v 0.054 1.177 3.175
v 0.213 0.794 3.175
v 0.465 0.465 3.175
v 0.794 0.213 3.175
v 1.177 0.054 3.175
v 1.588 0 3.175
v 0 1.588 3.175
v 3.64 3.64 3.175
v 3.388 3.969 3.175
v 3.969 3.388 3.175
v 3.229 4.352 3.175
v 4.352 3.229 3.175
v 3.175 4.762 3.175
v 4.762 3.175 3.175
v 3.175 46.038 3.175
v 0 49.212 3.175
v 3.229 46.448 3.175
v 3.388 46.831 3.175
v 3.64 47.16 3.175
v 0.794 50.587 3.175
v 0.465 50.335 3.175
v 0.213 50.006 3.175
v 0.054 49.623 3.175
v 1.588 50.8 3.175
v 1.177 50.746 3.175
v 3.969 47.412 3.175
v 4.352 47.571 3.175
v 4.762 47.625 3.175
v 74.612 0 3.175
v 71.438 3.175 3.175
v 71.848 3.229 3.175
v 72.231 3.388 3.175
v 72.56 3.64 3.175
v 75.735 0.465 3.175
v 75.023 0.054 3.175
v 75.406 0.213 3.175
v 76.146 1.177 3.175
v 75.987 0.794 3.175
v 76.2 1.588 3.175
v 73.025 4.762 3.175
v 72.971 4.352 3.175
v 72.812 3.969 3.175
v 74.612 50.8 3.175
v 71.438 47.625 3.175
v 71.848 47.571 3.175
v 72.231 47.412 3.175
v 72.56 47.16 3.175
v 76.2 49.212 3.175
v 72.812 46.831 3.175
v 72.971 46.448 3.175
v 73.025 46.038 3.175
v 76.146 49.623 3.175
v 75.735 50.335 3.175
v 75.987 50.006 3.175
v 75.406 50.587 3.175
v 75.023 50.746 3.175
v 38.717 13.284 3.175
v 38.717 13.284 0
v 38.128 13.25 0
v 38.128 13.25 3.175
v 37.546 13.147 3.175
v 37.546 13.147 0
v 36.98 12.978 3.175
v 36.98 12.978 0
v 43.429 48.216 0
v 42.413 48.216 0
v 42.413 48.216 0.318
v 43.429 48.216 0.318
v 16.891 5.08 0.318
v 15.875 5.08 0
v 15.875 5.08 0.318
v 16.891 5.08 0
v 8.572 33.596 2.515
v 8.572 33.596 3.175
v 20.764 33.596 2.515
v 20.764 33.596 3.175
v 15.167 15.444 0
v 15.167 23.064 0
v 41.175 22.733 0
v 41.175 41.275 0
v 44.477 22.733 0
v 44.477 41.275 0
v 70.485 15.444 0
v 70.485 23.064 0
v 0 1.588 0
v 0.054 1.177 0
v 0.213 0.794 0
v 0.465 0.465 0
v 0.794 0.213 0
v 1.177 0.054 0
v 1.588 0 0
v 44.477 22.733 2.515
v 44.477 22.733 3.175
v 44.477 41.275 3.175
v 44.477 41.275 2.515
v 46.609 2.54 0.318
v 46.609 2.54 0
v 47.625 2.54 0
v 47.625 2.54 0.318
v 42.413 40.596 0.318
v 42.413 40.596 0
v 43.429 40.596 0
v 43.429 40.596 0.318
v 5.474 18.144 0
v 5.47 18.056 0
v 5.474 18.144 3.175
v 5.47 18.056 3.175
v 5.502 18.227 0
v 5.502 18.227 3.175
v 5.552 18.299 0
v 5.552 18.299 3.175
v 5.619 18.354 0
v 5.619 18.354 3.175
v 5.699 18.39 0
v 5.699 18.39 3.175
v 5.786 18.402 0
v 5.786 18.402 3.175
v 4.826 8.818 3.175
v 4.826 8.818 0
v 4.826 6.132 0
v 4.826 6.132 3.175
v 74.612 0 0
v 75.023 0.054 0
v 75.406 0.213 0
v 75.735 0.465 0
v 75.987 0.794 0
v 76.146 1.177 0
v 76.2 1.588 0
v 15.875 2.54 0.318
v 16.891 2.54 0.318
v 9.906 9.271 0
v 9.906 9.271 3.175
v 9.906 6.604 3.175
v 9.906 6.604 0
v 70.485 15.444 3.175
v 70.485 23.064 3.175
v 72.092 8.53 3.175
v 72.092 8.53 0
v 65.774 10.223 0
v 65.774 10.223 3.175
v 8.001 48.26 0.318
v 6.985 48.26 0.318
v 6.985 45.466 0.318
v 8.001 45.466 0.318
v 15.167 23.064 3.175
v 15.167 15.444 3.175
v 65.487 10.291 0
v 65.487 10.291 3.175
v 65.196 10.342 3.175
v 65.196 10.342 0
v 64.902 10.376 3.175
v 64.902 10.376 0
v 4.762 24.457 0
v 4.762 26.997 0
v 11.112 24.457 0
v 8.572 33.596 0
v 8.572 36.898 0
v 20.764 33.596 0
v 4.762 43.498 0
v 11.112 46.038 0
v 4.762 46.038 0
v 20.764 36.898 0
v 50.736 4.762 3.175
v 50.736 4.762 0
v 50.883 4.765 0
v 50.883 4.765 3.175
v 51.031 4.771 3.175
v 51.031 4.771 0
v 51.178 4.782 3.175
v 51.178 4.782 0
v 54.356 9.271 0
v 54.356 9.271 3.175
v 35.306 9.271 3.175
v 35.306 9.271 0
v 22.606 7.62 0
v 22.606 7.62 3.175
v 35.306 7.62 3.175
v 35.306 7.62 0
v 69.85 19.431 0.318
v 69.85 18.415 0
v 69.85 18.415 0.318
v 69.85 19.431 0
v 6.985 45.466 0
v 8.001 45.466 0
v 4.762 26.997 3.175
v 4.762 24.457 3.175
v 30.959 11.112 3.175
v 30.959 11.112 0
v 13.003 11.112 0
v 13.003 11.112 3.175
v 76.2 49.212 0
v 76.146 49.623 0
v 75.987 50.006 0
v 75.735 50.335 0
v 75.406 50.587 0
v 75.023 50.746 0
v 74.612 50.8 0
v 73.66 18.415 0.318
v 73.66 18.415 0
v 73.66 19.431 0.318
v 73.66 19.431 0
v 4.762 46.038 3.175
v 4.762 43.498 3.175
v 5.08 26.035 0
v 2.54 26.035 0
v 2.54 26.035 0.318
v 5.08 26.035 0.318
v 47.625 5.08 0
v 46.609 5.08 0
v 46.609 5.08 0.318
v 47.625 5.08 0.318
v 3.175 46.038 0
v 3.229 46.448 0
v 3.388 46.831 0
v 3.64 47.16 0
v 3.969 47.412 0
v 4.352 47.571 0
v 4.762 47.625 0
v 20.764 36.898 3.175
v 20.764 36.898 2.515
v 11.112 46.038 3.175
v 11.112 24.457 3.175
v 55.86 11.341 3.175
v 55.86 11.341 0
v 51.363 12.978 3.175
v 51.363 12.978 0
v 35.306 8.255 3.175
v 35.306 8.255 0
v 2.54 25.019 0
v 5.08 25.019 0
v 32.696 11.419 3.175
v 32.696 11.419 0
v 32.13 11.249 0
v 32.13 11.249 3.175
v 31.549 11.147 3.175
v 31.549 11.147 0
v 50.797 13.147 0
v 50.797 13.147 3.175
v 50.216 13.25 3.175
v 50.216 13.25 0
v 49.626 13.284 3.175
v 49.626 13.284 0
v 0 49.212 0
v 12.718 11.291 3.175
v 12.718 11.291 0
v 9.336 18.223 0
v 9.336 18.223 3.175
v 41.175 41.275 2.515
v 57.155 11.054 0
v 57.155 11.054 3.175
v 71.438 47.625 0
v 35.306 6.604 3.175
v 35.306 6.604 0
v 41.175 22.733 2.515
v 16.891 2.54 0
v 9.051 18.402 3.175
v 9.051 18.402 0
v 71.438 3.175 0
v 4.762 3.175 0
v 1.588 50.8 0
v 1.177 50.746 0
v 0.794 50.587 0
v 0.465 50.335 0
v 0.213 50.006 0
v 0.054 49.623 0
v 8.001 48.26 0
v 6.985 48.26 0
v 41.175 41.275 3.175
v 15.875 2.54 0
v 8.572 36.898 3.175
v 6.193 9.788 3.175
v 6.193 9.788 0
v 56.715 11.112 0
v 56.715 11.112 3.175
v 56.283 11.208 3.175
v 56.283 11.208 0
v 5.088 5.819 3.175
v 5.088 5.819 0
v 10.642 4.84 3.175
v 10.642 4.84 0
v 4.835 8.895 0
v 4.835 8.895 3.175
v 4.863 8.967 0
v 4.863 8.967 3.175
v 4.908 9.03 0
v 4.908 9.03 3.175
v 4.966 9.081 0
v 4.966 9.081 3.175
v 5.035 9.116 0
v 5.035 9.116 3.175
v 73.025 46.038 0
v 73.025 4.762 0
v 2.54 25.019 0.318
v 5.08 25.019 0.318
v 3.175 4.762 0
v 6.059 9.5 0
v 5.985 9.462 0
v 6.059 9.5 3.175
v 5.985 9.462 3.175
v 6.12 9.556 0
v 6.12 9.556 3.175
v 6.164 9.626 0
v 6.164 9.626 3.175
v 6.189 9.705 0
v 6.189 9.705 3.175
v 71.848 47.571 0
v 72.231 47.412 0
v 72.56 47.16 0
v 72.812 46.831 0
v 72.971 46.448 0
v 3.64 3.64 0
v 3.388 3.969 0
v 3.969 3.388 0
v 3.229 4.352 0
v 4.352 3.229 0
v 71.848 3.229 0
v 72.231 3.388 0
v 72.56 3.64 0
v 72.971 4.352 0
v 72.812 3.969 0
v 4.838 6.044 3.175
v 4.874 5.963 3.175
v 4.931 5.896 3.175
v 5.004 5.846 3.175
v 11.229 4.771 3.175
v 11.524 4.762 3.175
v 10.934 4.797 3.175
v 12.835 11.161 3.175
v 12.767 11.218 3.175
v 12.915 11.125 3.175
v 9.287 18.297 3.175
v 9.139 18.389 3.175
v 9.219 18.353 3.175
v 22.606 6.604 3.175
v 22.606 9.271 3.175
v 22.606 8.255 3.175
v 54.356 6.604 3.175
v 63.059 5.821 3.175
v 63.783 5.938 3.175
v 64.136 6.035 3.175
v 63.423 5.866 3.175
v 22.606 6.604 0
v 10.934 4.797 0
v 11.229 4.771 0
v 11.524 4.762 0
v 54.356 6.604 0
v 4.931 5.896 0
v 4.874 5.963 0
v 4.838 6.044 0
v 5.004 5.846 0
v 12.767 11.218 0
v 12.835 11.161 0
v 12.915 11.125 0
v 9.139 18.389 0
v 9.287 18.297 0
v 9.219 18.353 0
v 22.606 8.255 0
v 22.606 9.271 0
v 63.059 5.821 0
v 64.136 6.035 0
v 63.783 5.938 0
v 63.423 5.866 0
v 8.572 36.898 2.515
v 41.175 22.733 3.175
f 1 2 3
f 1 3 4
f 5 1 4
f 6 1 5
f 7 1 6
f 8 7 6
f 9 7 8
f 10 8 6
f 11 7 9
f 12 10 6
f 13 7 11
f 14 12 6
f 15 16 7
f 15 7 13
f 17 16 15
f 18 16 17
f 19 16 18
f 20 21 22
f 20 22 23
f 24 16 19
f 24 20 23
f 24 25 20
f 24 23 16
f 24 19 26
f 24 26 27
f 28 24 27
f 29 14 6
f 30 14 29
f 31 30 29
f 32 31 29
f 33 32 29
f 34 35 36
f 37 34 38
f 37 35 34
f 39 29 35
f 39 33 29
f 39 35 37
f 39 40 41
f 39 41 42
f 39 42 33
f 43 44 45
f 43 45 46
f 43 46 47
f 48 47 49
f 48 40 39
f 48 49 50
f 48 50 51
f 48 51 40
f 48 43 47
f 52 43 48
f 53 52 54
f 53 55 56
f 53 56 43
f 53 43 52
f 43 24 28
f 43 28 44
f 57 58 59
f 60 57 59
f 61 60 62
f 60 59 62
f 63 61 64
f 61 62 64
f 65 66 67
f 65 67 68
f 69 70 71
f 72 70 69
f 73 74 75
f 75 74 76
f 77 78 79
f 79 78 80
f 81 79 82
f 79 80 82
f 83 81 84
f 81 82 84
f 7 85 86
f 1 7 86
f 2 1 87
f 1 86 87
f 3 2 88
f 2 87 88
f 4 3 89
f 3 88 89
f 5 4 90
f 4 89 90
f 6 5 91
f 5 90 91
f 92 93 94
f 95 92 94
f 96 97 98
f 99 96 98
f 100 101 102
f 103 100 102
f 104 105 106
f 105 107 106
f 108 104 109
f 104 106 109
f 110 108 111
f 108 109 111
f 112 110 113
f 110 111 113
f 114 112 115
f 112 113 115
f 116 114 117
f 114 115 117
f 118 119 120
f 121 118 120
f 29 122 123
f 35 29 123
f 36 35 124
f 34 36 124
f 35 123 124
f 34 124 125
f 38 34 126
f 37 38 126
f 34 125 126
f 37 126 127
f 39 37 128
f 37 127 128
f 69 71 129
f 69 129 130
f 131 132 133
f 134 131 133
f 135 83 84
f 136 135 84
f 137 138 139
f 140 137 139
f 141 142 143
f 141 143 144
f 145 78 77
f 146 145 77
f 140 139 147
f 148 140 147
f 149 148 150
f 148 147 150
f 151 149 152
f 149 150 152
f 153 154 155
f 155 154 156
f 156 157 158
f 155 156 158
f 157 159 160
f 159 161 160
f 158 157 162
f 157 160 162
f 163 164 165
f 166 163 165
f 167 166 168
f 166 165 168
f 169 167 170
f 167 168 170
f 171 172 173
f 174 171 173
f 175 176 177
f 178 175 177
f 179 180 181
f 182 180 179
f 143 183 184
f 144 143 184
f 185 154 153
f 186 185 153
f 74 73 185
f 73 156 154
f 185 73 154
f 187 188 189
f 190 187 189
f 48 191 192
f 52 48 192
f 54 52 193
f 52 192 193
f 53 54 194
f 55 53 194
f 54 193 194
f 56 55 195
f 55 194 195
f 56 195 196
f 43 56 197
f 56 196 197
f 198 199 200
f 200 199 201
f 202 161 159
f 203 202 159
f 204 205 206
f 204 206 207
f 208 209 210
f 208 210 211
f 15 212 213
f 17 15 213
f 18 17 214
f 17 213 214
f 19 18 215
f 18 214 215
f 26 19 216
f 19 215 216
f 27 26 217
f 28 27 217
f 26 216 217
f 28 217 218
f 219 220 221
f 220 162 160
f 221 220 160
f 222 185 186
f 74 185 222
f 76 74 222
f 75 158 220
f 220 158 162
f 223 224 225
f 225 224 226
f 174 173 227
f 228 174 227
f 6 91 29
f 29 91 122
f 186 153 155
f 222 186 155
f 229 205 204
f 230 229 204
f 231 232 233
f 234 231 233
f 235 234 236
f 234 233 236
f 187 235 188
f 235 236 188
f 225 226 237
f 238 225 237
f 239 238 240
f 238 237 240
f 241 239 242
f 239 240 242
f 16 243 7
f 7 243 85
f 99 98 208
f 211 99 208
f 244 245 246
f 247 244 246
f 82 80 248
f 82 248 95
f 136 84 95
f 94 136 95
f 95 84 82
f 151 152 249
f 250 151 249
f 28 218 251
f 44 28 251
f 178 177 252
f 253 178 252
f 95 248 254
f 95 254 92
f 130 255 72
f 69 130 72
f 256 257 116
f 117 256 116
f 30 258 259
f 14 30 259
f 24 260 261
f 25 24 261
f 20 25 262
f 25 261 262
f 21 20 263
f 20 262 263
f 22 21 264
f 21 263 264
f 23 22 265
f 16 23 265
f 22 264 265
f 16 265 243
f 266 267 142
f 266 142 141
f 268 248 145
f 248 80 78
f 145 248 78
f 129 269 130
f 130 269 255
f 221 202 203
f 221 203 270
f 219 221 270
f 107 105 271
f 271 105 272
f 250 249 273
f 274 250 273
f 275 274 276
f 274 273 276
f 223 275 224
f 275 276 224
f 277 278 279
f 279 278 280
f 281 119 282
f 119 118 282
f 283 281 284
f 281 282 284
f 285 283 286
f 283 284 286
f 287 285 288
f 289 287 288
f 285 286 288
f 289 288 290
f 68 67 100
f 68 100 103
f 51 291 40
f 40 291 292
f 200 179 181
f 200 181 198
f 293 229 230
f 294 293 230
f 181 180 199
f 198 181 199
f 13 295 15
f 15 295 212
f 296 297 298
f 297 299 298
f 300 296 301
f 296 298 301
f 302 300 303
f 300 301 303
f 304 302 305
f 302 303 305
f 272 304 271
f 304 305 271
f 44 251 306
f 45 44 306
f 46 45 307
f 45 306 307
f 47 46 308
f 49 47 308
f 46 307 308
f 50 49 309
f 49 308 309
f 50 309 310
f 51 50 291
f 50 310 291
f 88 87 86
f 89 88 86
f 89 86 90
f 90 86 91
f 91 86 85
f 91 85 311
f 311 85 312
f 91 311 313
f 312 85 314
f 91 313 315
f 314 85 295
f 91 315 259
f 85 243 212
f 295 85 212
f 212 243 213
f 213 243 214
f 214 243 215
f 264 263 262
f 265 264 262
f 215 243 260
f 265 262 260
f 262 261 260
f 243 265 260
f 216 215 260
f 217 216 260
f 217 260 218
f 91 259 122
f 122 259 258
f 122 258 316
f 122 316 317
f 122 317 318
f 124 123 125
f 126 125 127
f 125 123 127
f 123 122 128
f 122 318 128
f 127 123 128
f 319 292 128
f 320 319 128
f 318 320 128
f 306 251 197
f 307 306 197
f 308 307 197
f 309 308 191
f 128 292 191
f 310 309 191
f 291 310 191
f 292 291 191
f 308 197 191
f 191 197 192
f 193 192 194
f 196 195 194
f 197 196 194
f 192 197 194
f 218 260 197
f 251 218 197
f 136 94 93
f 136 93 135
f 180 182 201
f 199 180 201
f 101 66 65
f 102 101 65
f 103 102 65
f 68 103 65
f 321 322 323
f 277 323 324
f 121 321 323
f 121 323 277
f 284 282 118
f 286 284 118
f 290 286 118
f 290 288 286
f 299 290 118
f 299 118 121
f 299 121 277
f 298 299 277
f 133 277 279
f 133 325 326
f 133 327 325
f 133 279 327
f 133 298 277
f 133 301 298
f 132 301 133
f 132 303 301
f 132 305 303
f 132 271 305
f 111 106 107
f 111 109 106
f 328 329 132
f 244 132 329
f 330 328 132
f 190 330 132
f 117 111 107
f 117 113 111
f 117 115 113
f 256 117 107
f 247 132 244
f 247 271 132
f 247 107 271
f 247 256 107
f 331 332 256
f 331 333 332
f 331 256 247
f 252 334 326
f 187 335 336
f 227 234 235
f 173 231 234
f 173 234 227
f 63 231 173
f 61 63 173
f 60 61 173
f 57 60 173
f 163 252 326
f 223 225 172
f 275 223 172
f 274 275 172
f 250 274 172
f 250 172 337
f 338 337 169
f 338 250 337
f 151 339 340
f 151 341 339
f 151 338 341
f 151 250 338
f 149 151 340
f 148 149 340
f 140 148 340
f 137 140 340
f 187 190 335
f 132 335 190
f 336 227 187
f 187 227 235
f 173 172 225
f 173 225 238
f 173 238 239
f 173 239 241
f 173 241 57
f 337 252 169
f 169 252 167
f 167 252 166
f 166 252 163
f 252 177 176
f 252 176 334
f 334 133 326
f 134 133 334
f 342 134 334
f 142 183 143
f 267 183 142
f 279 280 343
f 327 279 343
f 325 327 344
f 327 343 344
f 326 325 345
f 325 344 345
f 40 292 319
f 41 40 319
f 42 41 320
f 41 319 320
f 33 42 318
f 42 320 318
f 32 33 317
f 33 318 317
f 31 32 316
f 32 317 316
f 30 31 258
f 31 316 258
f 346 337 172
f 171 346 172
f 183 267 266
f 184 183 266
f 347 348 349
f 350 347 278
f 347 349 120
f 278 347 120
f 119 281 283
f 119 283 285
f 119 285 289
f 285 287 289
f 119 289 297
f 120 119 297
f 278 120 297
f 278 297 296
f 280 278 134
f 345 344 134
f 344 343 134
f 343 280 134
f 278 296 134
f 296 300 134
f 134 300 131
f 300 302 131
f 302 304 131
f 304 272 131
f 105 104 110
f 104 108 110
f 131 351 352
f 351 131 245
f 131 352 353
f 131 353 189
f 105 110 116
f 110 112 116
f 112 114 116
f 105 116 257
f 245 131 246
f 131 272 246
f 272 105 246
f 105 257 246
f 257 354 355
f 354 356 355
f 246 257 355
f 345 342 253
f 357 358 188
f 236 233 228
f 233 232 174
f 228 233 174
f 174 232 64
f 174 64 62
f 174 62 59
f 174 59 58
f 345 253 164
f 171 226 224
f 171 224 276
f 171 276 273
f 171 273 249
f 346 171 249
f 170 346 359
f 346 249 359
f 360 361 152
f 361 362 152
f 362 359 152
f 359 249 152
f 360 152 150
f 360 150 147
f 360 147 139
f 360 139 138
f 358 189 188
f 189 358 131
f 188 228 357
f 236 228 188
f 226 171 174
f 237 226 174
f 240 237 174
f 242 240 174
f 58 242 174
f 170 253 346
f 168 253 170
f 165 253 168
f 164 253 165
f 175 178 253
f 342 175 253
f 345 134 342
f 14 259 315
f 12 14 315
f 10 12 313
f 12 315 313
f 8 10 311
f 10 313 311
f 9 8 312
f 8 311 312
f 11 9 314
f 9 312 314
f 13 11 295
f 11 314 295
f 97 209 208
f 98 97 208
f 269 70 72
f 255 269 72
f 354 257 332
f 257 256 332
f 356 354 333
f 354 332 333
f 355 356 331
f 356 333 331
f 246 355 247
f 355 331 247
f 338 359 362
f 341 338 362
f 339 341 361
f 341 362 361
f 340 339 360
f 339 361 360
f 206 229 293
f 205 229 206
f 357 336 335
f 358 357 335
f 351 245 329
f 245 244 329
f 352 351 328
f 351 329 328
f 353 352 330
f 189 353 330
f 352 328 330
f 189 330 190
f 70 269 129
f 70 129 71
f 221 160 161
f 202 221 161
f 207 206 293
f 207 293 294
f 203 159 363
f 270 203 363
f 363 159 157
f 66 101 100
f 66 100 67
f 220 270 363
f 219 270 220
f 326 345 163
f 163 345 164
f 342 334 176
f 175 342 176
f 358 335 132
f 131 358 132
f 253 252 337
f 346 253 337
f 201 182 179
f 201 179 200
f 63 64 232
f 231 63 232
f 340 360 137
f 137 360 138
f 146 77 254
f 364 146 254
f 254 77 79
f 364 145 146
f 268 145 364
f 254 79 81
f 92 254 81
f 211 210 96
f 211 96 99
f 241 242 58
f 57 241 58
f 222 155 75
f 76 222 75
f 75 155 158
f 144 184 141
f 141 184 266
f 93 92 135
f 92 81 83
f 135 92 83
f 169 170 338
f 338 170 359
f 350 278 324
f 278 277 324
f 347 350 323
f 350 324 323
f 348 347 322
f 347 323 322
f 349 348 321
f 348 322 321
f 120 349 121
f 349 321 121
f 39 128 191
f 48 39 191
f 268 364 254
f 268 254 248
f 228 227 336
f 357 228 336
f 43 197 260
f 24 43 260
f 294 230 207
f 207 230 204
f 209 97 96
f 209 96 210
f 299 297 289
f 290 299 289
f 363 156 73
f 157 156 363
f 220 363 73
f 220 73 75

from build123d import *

# Parameters (mm, degrees)
F1_DEPTH    = 3.175
F3_DEPTH    = 3.175
F4_T1_DEPTH = 3.175
F4_T3_DEPTH = 5.3972120536
F4_T5_DEPTH = 7.65370531
F4_T7_DEPTH = 5.937328176
F4_T9_DEPTH = 4.2839879499
F5_R        = 0.3175
F7_DEPTH    = 25.4
F8_W        = 12.192
F8_H        = 3.302
F9_DEPTH    = 3.175
F10_W       = 12.192
F10_H       = 3.302
F11_DEPTH   = 0.6604
F12_W       = 3.302
F12_H       = 18.542
F13_DEPTH   = 3.175
F14_W       = 3.302
F14_H       = 18.542
F15_DEPTH   = 0.6604
F16_W       = 3.81
F16_H       = 1.016
F17_DEPTH   = 0.3175
F16_W_2     = 1.016
F16_H_2     = 7.62
F16_H_3     = 2.54
F16_W_3     = 2.54
F16_H_4     = 2.794


# Not quite as in the source:
# - a fillet or chamfer that OpenCascade refuses, or shapes differently, is made with other operations: its cross-section is extruded or revolved along the edge and cut away or added


with BuildPart() as f1:
    # F0 (on Top) → F1 (new body)
    with BuildSketch(Plane.XY):
        with BuildLine():
            ThreePointArc((0, 1.5875), (0.4649679849, 0.4649679849), (1.5875, 0))
            Line((1.5875, 0), (74.6125, 0))
            ThreePointArc((74.6125, 0), (75.7350320151, 0.4649679849), (76.2, 1.5875))
            Line((76.2, 1.5875), (76.2, 49.2125))
            ThreePointArc((76.2, 49.2125), (75.7350320151, 50.3350320151), (74.6125, 50.8))
            Line((74.6125, 50.8), (1.5875, 50.8))
            ThreePointArc((1.5875, 50.8), (0.4649679849, 50.3350320151), (0, 49.2125))
            Line((0, 49.2125), (0, 1.5875))
        make_face()
        with BuildLine():
            Line((73.025, 46.0375), (73.025, 4.7625))
            ThreePointArc((73.025, 4.7625), (72.5600320151, 3.6399679849), (71.4375, 3.175))
            Line((71.4375, 3.175), (4.7625, 3.175))
            ThreePointArc((4.7625, 3.175), (3.6399679849, 3.6399679849), (3.175, 4.7625))
            Line((3.175, 4.7625), (3.175, 46.0375))
            ThreePointArc((3.175, 46.0375), (3.6399679849, 47.1600320151), (4.7625, 47.625))
            Line((4.7625, 47.625), (71.4375, 47.625))
            ThreePointArc((71.4375, 47.625), (72.5600320151, 47.1600320151), (73.025, 46.0375))
        make_face(mode=Mode.SUBTRACT)
    extrude(amount=F1_DEPTH)


with BuildPart() as f3:
    # F2 (on Top) → F3 (new body)
    with BuildSketch(Plane.XY):
        Polygon((4.826, 5.8651659282), (11.0795292316, 4.7625), (50.9575292316, 4.7625), (63.6092018974, 5.8693779329), (72.0917764651, 8.5298344169), (65.3447845685, 10.337685447), (56.4886137024, 11.1125), (50.5215655604, 13.2843279101), (37.8215655604, 13.2843279101), (31.8545174184, 11.1125), (12.8045174184, 11.1125), (9.2493856396, 18.4016003435), (5.4393856396, 18.4016003435), (6.2142001926, 9.5454294775), (4.826, 9.0401659282), align=None)
    extrude(amount=F3_DEPTH)

    # F4: fillet of radius 5.08 on 8 edges, made by hand

    # F4_s2 → F4_t1 (join)
    with BuildSketch(Plane.XY):
        with BuildLine():
            ThreePointArc((57.1548634245, 11.0542107022), (56.4981013588, 11.1552960524), (55.8601522695, 11.341241255))
            Line((55.8601522695, 11.341241255), (56.4886137024, 11.1125))
            Line((56.4886137024, 11.1125), (57.1548634245, 11.0542107022))
        make_face()
        with BuildLine():
            ThreePointArc((32.6962386845, 11.4188614864), (31.840909099, 11.1896766147), (30.9587763564, 11.1125))
            Line((30.9587763564, 11.1125), (31.8545174184, 11.1125))
            Line((31.8545174184, 11.1125), (32.6962386845, 11.4188614864))
        make_face()
    extrude(amount=F4_T1_DEPTH)

    # F4_s4 → F4_t3 (cut)
    with BuildSketch(Plane.XY.offset(-1.1111060268)):
        with BuildLine():
            ThreePointArc((65.7740829713, 10.2226552866), (65.3414149647, 10.3185754744), (64.9020333953, 10.3764211554))
            Line((64.9020333953, 10.3764211554), (65.3447845685, 10.337685447))
            Line((65.3447845685, 10.337685447), (65.7740829713, 10.2226552866))
        make_face()
        with BuildLine():
            ThreePointArc((10.6418388998, 4.8396766147), (11.0812204692, 4.7818309337), (11.5239716423, 4.7625))
            Line((11.5239716423, 4.7625), (11.0795292316, 4.7625))
            Line((11.0795292316, 4.7625), (10.6418388998, 4.8396766147))
        make_face()
    extrude(amount=F4_T3_DEPTH, mode=Mode.SUBTRACT)

    # F4_s6 → F4_t5 (cut)
    with BuildSketch(Plane.XY.offset(-2.239352655)):
        with BuildLine():
            ThreePointArc((51.3632868265, 12.9779664237), (50.507957241, 13.2071512954), (49.6258244984, 13.2843279101))
            Line((49.6258244984, 13.2843279101), (50.5215655604, 13.2843279101))
            Line((50.5215655604, 13.2843279101), (51.3632868265, 12.9779664237))
        make_face()
        with BuildLine():
            ThreePointArc((38.7173066224, 13.2843279101), (37.8351738799, 13.2071512954), (36.9798442943, 12.9779664237))
            Line((36.9798442943, 12.9779664237), (37.8215655604, 13.2843279101))
            Line((37.8215655604, 13.2843279101), (38.7173066224, 13.2843279101))
        make_face()
    extrude(amount=F4_T5_DEPTH, mode=Mode.SUBTRACT)

    # F4_s8 → F4_t7 (cut)
    with BuildSketch(Plane.XY.offset(-1.381164088)):
        with BuildLine():
            ThreePointArc((63.0588385607, 5.8212273801), (63.6033805865, 5.8987596693), (64.1363482356, 6.0347109792))
            Line((64.1363482356, 6.0347109792), (63.6092018974, 5.8693779329))
            Line((63.6092018974, 5.8693779329), (63.0588385607, 5.8212273801))
        make_face()
    extrude(amount=F4_T7_DEPTH, mode=Mode.SUBTRACT)

    # F4_s10 → F4_t9 (cut)
    with BuildSketch(Plane.XY.offset(-0.5544939749)):
        with BuildLine():
            ThreePointArc((50.7357316417, 4.7625), (50.9573181295, 4.7673350344), (51.1784828148, 4.7818309337))
            Line((51.1784828148, 4.7818309337), (50.9575292316, 4.7625))
            Line((50.9575292316, 4.7625), (50.7357316417, 4.7625))
        make_face()
    extrude(amount=F4_T9_DEPTH, mode=Mode.SUBTRACT)

    # F5
    f5_edges = [f3.edges().sort_by_distance(p)[0] for p in [
        (4.826, 5.865166, 1.5875),
        (4.826, 9.040166, 1.5875),
        (6.2142, 9.545429, 1.5875),
        (5.439386, 18.4016, 1.5875),
        (9.249386, 18.4016, 1.5875),
        (12.804517, 11.1125, 1.5875),
    ]]
    fillet(f5_edges, radius=F5_R)

    # F6 (on face) → F7 (cut)
    with BuildSketch(Plane.XY.offset(3.175)):
        Polygon((22.606, 9.271), (9.906, 9.271), (9.906, 6.604), (22.606, 6.604), (22.606, 7.62), (35.306, 7.62), (35.306, 6.604), (54.356, 6.604), (54.356, 9.271), (35.306, 9.271), (35.306, 8.255), (22.606, 8.255), align=None)
    extrude(amount=-F7_DEPTH, mode=Mode.SUBTRACT)


with BuildPart() as f9:
    # F8 (on Top) → F9 (new body)
    with BuildSketch(Plane.XY):
        Polygon((4.7625, 43.4975), (8.5725, 36.8983864232), (20.7645, 36.8983864232), (11.1125, 46.0375), (4.7625, 46.0375), align=None)
        with Locations((14.6685, 35.2473864232)):
            Rectangle(F8_W, F8_H)
        Polygon((20.7645, 33.5963864232), (8.5725, 33.5963864232), (4.7625, 26.9972728463), (4.7625, 24.4572728463), (11.1125, 24.4572728463), align=None)
    extrude(amount=F9_DEPTH)

    # F10 (on face) → F11 (cut)
    with BuildSketch(Plane.XY.offset(3.175)):
        with Locations((14.6685, 35.2473864232)):
            Rectangle(F10_W, F10_H)
    extrude(amount=-F11_DEPTH, mode=Mode.SUBTRACT)


with BuildPart() as f13:
    # F12 (on Top) → F13 (new body)
    with BuildSketch(Plane.XY):
        with Locations((42.8259225938, 32.004)):
            Rectangle(F12_W, F12_H)
        Polygon((41.1749225938, 22.733), (41.1749225938, 41.275), (15.1668451876, 23.0639481459), (15.1668451876, 15.4439481459), align=None)
        Polygon((70.485, 23.0639481459), (44.4769225938, 41.275), (44.4769225938, 22.733), (70.485, 15.4439481459), align=None)
    extrude(amount=F13_DEPTH)

    # F14 (on face) → F15 (cut)
    with BuildSketch(Plane.XY.offset(3.175)):
        with Locations((42.8259225938, 32.004)):
            Rectangle(F14_W, F14_H)
    extrude(amount=-F15_DEPTH, mode=Mode.SUBTRACT)


with BuildPart() as f17:
    # F16 (on Top) → F17 (new body)
    with BuildSketch(Plane.XY):
        with Locations((71.755, 18.923)):
            Rectangle(F16_W, F16_H)
    extrude(amount=F17_DEPTH)


with BuildPart() as f17b:
    # F16 (on Top) → F17, piece 2 (new body)
    with BuildSketch(Plane.XY):
        with Locations((42.9211696643, 44.4056276325)):
            Rectangle(F16_W_2, F16_H_2)
    extrude(amount=F17_DEPTH)


with BuildPart() as f17c:
    # F16 (on Top) → F17, piece 3 (new body)
    with BuildSketch(Plane.XY):
        with Locations((47.117, 3.81)):
            Rectangle(F16_W_2, F16_H_3)
    extrude(amount=F17_DEPTH)


with BuildPart() as f17d:
    # F16 (on Top) → F17, piece 4 (new body)
    with BuildSketch(Plane.XY):
        with Locations((16.383, 3.81)):
            Rectangle(F16_W_2, F16_H_3)
    extrude(amount=F17_DEPTH)


with BuildPart() as f17e:
    # F16 (on Top) → F17, piece 5 (new body)
    with BuildSketch(Plane.XY):
        with Locations((3.81, 25.527)):
            Rectangle(F16_W_3, F16_H)
    extrude(amount=F17_DEPTH)


with BuildPart() as f17f:
    # F16 (on Top) → F17, piece 6 (new body)
    with BuildSketch(Plane.XY):
        with Locations((7.493, 46.863)):
            Rectangle(F16_W_2, F16_H_4)
    extrude(amount=F17_DEPTH)


solid = Compound([f1.part, f3.part, f9.part, f13.part, f17.part, f17b.part, f17c.part, f17d.part, f17e.part, f17f.part])
